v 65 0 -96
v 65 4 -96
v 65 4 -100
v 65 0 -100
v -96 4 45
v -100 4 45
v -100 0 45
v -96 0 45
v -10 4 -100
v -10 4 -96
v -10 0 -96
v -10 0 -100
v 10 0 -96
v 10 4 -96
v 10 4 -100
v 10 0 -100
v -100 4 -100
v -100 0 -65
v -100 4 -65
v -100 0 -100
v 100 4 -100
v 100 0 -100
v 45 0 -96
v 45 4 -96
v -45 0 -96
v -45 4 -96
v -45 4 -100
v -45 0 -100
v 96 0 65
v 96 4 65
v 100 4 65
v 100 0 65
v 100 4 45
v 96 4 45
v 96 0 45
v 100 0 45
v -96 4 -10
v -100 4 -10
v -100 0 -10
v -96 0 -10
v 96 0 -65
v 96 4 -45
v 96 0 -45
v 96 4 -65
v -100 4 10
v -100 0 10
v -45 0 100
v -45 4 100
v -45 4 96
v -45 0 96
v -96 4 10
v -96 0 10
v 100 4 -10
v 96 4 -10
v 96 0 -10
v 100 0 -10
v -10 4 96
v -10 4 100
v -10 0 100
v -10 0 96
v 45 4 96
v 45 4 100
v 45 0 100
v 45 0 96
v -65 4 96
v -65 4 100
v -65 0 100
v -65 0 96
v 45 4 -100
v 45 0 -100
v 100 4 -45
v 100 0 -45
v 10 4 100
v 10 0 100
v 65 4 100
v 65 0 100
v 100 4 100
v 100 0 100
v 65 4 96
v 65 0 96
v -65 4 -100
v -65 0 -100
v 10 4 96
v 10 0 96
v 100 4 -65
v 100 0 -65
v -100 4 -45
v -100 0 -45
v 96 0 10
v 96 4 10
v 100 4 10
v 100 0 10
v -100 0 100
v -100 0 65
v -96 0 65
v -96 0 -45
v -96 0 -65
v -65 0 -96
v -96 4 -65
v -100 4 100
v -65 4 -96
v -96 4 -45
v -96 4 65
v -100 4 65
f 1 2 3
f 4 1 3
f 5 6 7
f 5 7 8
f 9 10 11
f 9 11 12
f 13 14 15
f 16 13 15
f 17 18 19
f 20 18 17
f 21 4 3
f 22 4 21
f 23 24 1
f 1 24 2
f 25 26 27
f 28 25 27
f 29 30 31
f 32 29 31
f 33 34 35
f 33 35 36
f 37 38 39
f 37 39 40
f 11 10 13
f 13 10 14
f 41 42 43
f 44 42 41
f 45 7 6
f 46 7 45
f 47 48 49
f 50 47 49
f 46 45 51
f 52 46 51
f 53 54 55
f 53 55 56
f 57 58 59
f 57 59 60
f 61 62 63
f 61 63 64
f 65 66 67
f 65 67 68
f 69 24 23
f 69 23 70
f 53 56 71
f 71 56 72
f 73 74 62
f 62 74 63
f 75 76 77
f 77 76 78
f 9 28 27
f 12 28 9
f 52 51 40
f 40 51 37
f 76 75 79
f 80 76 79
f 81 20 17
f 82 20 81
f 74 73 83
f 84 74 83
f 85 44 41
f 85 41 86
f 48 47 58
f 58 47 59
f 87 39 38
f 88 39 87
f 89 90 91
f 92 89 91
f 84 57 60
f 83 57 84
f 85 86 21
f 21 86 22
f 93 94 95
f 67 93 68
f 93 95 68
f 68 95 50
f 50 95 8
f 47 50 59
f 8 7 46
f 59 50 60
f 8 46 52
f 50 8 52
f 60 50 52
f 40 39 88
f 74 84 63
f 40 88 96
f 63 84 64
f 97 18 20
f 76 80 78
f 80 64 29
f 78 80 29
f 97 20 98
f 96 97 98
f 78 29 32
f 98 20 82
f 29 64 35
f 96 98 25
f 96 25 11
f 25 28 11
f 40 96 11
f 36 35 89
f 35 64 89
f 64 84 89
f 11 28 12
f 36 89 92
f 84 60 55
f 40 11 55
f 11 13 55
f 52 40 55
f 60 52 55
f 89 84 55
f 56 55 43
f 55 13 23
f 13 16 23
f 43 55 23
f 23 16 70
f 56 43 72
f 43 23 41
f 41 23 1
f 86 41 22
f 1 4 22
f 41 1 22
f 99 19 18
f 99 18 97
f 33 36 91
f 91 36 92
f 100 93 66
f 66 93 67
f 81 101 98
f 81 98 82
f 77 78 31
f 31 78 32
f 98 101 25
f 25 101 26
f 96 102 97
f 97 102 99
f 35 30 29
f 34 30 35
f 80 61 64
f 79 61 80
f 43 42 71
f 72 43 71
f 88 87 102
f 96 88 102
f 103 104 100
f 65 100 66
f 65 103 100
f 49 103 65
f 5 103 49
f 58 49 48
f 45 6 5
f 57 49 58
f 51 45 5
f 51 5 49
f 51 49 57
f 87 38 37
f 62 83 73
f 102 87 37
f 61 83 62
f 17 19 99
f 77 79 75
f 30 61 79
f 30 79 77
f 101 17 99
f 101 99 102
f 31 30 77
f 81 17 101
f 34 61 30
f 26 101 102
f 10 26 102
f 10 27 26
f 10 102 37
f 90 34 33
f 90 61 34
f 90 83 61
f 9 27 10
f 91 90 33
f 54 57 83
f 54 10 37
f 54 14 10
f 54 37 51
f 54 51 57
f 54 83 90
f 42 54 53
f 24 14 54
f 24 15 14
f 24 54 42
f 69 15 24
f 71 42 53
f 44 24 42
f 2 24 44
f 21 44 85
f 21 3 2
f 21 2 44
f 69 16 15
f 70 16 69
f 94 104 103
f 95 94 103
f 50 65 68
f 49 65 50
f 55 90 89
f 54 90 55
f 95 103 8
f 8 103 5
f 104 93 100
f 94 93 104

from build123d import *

# Parameters (mm, degrees)
ESBO_O1_W                = 200
ESBO_O1_H                = 200
RESSALTO_EXTRUS_O1_DEPTH = 4
ESBO_O2_W                = 20
ESBO_O2_H                = 4
ESBO_O2_W_2              = 4
ESBO_O2_H_2              = 20
CORTE_EXTRUS_O1_DEPTH    = 5


with BuildPart() as part:
    # Esboço1 → Ressalto-extrusão1 (new body)
    with BuildSketch(Plane(origin=(0, 0, 0), x_dir=(1, 0, 0), z_dir=(0, 1, 0))):
        Rectangle(ESBO_O1_W, ESBO_O1_H)
    extrude(amount=RESSALTO_EXTRUS_O1_DEPTH)

    # Esboço2 → Corte-extrusão1 (cut, through all)
    with BuildSketch(Plane(origin=(0, 4, 0), x_dir=(1, 0, 0), z_dir=(0, 1, 0))):
        with Locations((-55, 98)):
            Rectangle(ESBO_O2_W, ESBO_O2_H)
        with Locations((55, 98)):
            Rectangle(ESBO_O2_W, ESBO_O2_H)
        with Locations((0, 98)):
            Rectangle(ESBO_O2_W, ESBO_O2_H)
        with Locations((98, 55)):
            Rectangle(ESBO_O2_W_2, ESBO_O2_H_2)
        with Locations((98, 0)):
            Rectangle(ESBO_O2_W_2, ESBO_O2_H_2)
        with Locations((98, -55)):
            Rectangle(ESBO_O2_W_2, ESBO_O2_H_2)
        with Locations((-98, 0)):
            Rectangle(ESBO_O2_W_2, ESBO_O2_H_2)
        with Locations((-98, -55)):
            Rectangle(ESBO_O2_W_2, ESBO_O2_H_2)
        with Locations((-98, 55)):
            Rectangle(ESBO_O2_W_2, ESBO_O2_H_2)
        with Locations((55, -98)):
            Rectangle(ESBO_O2_W, ESBO_O2_H)
        with Locations((-55, -98)):
            Rectangle(ESBO_O2_W, ESBO_O2_H)
        with Locations((0, -98)):
            Rectangle(ESBO_O2_W, ESBO_O2_H)
    extrude(amount=-CORTE_EXTRUS_O1_DEPTH, mode=Mode.SUBTRACT)


solid = part.part
